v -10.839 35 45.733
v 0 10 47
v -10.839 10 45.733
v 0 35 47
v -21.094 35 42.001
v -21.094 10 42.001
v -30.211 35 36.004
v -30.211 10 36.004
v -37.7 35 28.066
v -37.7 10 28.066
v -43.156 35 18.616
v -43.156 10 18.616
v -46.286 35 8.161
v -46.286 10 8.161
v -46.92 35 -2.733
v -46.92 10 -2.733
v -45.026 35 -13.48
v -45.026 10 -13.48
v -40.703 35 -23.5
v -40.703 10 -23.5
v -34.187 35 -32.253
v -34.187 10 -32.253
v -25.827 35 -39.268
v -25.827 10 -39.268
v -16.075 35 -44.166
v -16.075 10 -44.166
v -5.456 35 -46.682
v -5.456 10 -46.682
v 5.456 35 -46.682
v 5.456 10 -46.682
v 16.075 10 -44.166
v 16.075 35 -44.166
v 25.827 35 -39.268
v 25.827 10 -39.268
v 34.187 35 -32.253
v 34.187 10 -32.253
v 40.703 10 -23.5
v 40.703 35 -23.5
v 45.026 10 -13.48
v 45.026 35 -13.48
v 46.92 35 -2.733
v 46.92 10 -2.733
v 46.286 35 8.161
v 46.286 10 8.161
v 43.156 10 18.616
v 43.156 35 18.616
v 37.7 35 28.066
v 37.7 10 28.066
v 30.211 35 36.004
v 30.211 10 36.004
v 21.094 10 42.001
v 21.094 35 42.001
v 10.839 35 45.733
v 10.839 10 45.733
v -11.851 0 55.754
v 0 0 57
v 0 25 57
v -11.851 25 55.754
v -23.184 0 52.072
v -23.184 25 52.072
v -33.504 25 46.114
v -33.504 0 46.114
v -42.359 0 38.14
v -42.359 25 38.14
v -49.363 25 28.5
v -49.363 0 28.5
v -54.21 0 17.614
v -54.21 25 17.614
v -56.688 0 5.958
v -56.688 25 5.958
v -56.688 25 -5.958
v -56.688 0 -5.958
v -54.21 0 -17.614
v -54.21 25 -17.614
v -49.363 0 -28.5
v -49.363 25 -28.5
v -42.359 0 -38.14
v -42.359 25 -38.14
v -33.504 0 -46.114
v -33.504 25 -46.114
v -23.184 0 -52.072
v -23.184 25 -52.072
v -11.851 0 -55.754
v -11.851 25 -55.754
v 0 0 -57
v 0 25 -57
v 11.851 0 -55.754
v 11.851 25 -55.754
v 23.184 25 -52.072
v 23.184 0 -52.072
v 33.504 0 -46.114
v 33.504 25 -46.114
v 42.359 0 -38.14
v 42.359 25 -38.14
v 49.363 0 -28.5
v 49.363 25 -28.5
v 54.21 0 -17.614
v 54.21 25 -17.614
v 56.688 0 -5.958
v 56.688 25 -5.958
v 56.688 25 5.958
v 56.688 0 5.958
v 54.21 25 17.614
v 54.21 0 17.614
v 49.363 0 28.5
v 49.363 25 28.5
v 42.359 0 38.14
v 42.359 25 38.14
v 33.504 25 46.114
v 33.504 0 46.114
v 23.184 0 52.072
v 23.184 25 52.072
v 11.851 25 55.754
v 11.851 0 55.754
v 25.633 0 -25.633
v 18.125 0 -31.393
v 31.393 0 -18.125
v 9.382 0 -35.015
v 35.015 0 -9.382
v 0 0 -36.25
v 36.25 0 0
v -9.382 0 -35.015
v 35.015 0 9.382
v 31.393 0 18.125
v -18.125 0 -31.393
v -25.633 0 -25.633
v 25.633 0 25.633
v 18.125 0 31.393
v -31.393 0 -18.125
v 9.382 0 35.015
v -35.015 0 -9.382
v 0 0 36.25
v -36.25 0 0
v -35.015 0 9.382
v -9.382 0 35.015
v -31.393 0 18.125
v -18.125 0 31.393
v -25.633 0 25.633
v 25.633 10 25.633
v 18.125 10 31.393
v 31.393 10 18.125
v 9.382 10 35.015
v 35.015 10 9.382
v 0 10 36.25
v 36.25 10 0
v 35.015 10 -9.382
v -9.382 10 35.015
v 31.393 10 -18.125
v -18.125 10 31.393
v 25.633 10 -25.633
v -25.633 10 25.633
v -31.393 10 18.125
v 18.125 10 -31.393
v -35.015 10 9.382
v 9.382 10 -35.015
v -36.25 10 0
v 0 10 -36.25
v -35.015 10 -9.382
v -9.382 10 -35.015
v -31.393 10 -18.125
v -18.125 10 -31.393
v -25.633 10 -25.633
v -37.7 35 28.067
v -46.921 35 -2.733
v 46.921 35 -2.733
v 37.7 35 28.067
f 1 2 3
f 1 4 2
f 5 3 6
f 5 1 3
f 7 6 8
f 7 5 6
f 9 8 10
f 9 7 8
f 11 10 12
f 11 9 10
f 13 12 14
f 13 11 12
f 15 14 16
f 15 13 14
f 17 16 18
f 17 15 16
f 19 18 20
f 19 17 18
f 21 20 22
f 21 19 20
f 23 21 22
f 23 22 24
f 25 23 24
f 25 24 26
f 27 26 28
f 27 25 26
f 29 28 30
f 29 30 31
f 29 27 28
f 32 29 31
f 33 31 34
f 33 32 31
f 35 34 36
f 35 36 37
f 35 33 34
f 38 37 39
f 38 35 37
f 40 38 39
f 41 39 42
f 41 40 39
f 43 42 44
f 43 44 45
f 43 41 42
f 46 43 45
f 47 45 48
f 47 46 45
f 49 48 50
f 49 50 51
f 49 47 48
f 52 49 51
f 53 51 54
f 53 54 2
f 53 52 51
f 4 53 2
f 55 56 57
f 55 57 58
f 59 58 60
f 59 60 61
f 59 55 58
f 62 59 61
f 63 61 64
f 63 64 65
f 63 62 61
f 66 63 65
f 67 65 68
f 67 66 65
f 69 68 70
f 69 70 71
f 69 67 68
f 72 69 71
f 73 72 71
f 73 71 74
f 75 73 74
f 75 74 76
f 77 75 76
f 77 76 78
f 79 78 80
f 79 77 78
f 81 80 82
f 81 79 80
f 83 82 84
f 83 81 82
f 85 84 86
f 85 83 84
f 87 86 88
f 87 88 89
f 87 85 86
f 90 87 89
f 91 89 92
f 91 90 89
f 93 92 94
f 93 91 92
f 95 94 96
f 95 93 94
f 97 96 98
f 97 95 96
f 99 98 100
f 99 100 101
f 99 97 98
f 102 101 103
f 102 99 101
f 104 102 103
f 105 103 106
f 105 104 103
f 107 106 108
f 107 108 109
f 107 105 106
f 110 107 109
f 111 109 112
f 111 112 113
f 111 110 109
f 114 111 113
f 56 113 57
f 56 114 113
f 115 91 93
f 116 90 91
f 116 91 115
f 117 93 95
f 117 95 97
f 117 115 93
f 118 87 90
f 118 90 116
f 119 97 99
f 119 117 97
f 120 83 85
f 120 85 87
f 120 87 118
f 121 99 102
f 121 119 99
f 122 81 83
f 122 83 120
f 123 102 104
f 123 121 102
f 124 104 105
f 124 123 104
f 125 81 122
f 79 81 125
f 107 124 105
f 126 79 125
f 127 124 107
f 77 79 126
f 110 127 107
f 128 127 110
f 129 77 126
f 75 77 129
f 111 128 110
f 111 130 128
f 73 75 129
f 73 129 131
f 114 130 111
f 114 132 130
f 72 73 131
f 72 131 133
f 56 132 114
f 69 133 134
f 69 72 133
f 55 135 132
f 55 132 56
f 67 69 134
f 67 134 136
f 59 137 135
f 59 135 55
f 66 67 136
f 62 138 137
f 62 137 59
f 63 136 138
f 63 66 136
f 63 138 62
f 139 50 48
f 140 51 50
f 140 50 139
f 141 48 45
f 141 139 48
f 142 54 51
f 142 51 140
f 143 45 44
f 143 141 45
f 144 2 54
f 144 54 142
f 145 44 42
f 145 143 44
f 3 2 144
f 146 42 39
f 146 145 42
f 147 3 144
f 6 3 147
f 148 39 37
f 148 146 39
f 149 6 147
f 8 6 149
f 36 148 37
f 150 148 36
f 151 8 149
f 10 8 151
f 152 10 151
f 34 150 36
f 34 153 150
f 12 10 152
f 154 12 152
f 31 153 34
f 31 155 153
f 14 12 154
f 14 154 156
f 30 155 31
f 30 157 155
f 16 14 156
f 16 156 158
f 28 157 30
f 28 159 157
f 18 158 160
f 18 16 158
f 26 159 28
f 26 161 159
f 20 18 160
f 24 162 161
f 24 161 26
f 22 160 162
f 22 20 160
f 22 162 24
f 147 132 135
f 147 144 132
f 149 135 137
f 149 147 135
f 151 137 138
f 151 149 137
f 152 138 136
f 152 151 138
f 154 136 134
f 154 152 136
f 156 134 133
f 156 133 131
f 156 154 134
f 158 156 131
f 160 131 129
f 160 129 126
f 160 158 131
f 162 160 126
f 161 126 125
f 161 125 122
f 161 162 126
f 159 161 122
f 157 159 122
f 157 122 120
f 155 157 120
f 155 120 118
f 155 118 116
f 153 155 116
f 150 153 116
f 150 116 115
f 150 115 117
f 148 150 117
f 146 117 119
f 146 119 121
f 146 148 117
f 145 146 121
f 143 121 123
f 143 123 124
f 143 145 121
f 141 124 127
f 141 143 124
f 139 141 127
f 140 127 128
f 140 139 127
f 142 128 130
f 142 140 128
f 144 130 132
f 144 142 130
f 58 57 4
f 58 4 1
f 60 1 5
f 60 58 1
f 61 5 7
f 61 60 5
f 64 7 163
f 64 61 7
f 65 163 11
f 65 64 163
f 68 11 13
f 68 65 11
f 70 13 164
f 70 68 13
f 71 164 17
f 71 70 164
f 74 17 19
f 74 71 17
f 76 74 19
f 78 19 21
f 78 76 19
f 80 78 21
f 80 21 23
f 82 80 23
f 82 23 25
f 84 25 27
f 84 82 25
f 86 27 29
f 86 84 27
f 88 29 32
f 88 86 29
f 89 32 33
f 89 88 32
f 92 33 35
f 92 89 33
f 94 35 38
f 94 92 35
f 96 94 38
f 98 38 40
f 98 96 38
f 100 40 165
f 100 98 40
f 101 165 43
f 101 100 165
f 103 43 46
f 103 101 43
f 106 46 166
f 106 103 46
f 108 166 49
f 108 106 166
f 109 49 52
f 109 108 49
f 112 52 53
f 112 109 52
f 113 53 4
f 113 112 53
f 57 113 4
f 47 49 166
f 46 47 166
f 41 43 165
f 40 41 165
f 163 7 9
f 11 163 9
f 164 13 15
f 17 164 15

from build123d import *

# Parameters (mm, degrees)
CHAMFER1_SIZE = 10


with BuildPart() as part:
    # Sketch1 → Revolve1 (revolve)
    with BuildSketch(Plane.XY, mode=Mode.PRIVATE) as revolve1_sk:
        Polygon((36.25, 0), (36.25, 10), (47, 10), (47, 35), (57, 35), (57, 0), align=None)
    revolve(revolve1_sk.sketch.rotate(Axis((0, 630.278330928, 0), (0, -1, 0)), 90), axis=Axis((0, 630.278330928, 0), (0, -1, 0)))

    # Chamfer1
    chamfer1_edges = [part.edges().sort_by_distance(p)[0] for p in [
        (0, 35, -57),
    ]]
    chamfer(chamfer1_edges, length=CHAMFER1_SIZE - 0.0001)  # a hair under: the kernel refuses the full size


solid = part.part
